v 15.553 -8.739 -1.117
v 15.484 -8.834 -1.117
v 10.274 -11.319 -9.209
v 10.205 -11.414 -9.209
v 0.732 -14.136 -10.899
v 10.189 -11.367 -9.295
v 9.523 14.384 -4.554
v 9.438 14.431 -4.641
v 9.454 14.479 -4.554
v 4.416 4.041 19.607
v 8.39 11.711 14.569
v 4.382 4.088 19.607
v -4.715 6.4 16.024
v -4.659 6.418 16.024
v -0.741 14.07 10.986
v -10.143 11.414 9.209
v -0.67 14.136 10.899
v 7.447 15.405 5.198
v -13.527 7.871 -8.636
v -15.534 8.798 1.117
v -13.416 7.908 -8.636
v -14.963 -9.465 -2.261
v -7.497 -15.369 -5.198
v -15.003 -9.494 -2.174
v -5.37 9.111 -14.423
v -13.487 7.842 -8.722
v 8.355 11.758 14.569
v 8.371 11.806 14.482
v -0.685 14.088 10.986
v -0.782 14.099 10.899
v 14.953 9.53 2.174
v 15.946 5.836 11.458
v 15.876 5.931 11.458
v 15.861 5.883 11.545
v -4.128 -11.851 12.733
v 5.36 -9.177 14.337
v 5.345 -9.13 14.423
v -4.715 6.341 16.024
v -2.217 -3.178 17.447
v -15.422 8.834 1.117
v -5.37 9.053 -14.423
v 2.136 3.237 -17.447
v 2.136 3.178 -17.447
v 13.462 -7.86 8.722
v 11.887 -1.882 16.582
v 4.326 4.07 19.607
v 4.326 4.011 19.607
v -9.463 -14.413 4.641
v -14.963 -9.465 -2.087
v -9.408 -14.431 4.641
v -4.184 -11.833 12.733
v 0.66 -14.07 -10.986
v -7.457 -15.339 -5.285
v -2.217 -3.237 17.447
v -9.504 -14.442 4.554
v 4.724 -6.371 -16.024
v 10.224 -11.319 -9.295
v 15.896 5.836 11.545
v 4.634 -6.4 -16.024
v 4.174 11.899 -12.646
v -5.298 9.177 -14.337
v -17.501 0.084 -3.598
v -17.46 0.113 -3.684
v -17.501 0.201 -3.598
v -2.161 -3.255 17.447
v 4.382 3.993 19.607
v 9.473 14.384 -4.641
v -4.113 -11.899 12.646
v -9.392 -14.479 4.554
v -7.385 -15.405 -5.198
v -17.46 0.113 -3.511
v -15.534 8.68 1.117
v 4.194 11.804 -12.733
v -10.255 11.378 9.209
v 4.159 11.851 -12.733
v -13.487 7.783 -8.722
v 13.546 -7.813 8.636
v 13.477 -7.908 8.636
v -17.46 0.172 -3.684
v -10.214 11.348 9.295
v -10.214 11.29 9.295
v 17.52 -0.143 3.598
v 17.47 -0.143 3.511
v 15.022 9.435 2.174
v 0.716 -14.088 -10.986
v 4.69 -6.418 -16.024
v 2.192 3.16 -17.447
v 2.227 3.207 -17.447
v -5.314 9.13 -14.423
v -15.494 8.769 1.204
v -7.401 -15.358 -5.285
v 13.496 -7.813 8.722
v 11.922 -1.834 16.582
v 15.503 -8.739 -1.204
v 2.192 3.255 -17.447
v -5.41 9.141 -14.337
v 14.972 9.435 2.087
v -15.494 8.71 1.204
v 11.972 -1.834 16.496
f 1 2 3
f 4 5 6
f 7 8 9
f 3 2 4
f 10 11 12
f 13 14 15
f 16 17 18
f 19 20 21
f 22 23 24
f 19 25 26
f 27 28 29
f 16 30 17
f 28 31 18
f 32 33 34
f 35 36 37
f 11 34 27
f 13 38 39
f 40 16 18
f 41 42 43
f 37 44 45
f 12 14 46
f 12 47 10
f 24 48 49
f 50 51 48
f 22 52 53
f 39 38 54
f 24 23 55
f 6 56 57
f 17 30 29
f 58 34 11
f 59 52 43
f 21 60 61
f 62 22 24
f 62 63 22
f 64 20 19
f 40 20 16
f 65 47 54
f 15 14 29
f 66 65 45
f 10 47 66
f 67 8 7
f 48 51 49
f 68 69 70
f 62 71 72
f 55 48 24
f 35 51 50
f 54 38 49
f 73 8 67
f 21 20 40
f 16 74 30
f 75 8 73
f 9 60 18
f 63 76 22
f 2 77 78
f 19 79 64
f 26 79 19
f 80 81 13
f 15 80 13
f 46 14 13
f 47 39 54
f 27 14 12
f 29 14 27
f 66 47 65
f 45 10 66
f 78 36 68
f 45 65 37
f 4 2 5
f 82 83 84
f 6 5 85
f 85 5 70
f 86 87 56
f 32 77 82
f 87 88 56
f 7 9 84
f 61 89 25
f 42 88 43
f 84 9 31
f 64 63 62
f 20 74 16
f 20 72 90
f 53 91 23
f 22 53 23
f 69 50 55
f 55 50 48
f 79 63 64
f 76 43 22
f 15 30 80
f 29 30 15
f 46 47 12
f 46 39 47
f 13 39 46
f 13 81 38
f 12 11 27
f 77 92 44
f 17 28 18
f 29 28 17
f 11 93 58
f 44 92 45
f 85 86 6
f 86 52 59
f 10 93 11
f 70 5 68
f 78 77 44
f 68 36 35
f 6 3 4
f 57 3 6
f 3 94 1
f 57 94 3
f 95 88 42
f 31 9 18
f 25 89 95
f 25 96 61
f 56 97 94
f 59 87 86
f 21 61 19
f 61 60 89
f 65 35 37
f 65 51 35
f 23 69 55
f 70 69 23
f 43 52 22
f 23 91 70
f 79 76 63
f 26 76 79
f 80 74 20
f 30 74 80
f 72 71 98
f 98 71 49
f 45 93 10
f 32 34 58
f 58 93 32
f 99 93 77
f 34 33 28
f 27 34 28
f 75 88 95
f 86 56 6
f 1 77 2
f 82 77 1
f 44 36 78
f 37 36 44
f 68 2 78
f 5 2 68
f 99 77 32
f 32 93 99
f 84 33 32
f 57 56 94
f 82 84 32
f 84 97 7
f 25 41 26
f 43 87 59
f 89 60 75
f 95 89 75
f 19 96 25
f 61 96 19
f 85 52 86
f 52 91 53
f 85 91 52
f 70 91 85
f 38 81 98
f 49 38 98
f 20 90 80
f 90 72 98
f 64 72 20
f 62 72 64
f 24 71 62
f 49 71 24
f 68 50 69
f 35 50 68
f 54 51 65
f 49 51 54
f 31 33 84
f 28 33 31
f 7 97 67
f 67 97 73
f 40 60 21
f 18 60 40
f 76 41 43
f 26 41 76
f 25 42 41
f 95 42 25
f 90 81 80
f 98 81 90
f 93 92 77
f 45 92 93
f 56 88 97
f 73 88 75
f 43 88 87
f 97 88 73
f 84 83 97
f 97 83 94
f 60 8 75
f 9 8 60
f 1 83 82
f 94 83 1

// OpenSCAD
// Auto-generated OpenSCAD file

    inner_points = 10*[[-0.21767207125666155, -0.32071847091711014, 1.7360795183920927], [-1.4922229350476093, -0.9435162185789954, -0.21739691757103918], [-0.46744991045730744, 0.6370588317477957, 1.5936938816719737], [-1.7420007742482555, 0.014261084085910432, -0.35978255429115813], [1.7420007742482542, -0.014261084085911972, 0.35978255429115813], [0.4674499104573061, -0.6370588317477972, -1.5936938816719737], [1.492222935047608, 0.9435162185789938, 0.21739691757103918], [0.21767207125666022, 0.3207184709171086, -1.7360795183920927], [-0.4143597724049588, -1.1803825334804832, 1.2646013664549804], [-0.942296026121513, -1.4383538071774526, 0.4554449329027941], [-1.017376819383404, 1.131896420346253, 0.9208520311981405], [-1.545313073099958, 0.8739251466492834, 0.11169559764595427], [1.5453130730999567, -0.873925146649285, -0.11169559764595427], [1.0173768193834027, -1.1318964203462543, -0.9208520311981405], [0.9422960261215116, 1.4383538071774513, -0.4554449329027941], [0.41435977240495747, 1.1803825334804818, -1.2646013664549804], [0.5329224201734905, -0.9082100060398764, 1.4336533198017478], [-0.7416284436174575, -1.5310077537017615, -0.5198231161613842], [-0.07009462680495482, 1.4040689477868598, 1.089903984544908], [-1.3446454905959027, 0.7812712001249748, -0.8635724514182238], [1.3446454905959013, -0.7812712001249763, 0.8635724514182238], [0.07009462680495349, -1.404068947786861, -1.089903984544908], [0.7416284436174562, 1.5310077537017601, 0.5198231161613842], [-0.5329224201734918, 0.9082100060398749, -1.4336533198017478], [0.43660784939141806, 0.40405282035525075, 1.9520062670457445], [1.584557624473923, 0.5835714012715488, 1.1457901713283336], [1.1872023408215704, -0.18343871476751553, 1.6495800684553996], [0.8339631330437706, 1.1710629363943152, 1.4482163699186787]];

    outer_points = 10*[[-0.2998492432811004, -0.8754891635864159, -1.5191519733455254], [-0.9669049177063294, 1.3048578449672972, -0.7257096161108192], [-0.8810229625548427, -1.3048578449672972, -0.8278635794933151], [-1.5480786369800716, 0.8754891635864159, -0.034421222258608775], [1.5480786369800716, -0.8754891635864159, 0.034421222258608775], [0.8810229625548427, 1.3048578449672972, 0.8278635794933151], [0.9669049177063294, -1.3048578449672972, 0.7257096161108192], [0.2998492432811004, 0.8754891635864159, 1.5191519733455254], [-0.084273448945414, 0.0667291961127105, -1.775572798440574], [-0.36057695615027563, 0.9698584977352651, -1.4469182131126805], [-1.4873509241108964, -0.9698584977352651, -0.10665498249145389], [-1.763654431315758, -0.0667291961127105, 0.2219996028364397], [1.763654431315758, 0.0667291961127105, -0.2219996028364397], [1.4873509241108964, 0.9698584977352651, 0.10665498249145389], [0.36057695615027563, -0.9698584977352651, 1.4469182131126805], [0.084273448945414, -0.0667291961127105, 1.775572798440574], [0.6523481796495847, -0.5718796573528687, -1.5529356304711843], [-0.01470749477564448, 1.6084673512008445, -0.7594932732364776], [-0.7507292955158978, -1.6084673512008445, 0.11598218547793598], [-1.417784969941127, 0.5718796573528687, 0.9094245427126425], [1.417784969941127, -0.5718796573528687, -0.9094245427126425], [0.7507292955158978, 1.6084673512008445, -0.11598218547793598], [0.01470749477564448, -1.6084673512008445, 0.7594932732364776], [-0.6523481796495847, 0.5718796573528687, 1.5529356304711843], [-0.012341624162016562, -1.728782357742436, -1.0841461184935561], [1.0701494658076132, -1.728782357742436, -0.17408401064796336], [0.9398557987686684, -1.4251728515088886, -1.1179297756192146], [0.11795204287692822, -2.0323918639759833, -0.1403003535223048]];

    // Convex hull for inner set (I)
    module inner_hull() {
        hull() {
            for (p = inner_points) {
                translate(p) sphere(r=0.1);
            }
        }
    }

    // Convex hull for outer set (O) minus inner hull (O \ I)
    module outer_minus_inner() {
        difference() {
            hull() {
                for (p = outer_points) {
                    translate(p) sphere(r=0.1);
                }
            }
            inner_hull(); // Subtract inner hull
        }
    }

    // Convex hull for outer set (O) minus all translated inner hulls
    module outer_minus_AllTranslationInner() {
        difference() {
            hull() {
                for (p = outer_points) {
                    translate(p) sphere(r=0.1);
                }
            }
            hull() {
                translate([0,0,50]) inner_hull();
                translate([0,0,-50]) inner_hull();
            }; // Subtract translated inner hulls
        }
    }

    // Difference between outer_minus_inner and outer_minus_AllTranslationInner
    module outer_minus_inner_diff() {
        difference() {
            // Outer minus inner
            difference() {
                hull() {
                    for (p = outer_points) {
                        translate(p) sphere(r=0.1);
                    }
                }
                inner_hull();
            }

            // Subtract Outer minus AllTranslationInner
            difference() {
                hull() {
                    for (p = outer_points) {
                        translate(p) sphere(r=0.1);
                    }
                }
                hull() {
                    translate([0,0,50]) inner_hull();
                    translate([0,0,-50]) inner_hull();
                };
            }
        }
    }

    // Rendering all with colors applied
    color([1, 0, 0, 0.5]) inner_hull(); // Transparent red
    
